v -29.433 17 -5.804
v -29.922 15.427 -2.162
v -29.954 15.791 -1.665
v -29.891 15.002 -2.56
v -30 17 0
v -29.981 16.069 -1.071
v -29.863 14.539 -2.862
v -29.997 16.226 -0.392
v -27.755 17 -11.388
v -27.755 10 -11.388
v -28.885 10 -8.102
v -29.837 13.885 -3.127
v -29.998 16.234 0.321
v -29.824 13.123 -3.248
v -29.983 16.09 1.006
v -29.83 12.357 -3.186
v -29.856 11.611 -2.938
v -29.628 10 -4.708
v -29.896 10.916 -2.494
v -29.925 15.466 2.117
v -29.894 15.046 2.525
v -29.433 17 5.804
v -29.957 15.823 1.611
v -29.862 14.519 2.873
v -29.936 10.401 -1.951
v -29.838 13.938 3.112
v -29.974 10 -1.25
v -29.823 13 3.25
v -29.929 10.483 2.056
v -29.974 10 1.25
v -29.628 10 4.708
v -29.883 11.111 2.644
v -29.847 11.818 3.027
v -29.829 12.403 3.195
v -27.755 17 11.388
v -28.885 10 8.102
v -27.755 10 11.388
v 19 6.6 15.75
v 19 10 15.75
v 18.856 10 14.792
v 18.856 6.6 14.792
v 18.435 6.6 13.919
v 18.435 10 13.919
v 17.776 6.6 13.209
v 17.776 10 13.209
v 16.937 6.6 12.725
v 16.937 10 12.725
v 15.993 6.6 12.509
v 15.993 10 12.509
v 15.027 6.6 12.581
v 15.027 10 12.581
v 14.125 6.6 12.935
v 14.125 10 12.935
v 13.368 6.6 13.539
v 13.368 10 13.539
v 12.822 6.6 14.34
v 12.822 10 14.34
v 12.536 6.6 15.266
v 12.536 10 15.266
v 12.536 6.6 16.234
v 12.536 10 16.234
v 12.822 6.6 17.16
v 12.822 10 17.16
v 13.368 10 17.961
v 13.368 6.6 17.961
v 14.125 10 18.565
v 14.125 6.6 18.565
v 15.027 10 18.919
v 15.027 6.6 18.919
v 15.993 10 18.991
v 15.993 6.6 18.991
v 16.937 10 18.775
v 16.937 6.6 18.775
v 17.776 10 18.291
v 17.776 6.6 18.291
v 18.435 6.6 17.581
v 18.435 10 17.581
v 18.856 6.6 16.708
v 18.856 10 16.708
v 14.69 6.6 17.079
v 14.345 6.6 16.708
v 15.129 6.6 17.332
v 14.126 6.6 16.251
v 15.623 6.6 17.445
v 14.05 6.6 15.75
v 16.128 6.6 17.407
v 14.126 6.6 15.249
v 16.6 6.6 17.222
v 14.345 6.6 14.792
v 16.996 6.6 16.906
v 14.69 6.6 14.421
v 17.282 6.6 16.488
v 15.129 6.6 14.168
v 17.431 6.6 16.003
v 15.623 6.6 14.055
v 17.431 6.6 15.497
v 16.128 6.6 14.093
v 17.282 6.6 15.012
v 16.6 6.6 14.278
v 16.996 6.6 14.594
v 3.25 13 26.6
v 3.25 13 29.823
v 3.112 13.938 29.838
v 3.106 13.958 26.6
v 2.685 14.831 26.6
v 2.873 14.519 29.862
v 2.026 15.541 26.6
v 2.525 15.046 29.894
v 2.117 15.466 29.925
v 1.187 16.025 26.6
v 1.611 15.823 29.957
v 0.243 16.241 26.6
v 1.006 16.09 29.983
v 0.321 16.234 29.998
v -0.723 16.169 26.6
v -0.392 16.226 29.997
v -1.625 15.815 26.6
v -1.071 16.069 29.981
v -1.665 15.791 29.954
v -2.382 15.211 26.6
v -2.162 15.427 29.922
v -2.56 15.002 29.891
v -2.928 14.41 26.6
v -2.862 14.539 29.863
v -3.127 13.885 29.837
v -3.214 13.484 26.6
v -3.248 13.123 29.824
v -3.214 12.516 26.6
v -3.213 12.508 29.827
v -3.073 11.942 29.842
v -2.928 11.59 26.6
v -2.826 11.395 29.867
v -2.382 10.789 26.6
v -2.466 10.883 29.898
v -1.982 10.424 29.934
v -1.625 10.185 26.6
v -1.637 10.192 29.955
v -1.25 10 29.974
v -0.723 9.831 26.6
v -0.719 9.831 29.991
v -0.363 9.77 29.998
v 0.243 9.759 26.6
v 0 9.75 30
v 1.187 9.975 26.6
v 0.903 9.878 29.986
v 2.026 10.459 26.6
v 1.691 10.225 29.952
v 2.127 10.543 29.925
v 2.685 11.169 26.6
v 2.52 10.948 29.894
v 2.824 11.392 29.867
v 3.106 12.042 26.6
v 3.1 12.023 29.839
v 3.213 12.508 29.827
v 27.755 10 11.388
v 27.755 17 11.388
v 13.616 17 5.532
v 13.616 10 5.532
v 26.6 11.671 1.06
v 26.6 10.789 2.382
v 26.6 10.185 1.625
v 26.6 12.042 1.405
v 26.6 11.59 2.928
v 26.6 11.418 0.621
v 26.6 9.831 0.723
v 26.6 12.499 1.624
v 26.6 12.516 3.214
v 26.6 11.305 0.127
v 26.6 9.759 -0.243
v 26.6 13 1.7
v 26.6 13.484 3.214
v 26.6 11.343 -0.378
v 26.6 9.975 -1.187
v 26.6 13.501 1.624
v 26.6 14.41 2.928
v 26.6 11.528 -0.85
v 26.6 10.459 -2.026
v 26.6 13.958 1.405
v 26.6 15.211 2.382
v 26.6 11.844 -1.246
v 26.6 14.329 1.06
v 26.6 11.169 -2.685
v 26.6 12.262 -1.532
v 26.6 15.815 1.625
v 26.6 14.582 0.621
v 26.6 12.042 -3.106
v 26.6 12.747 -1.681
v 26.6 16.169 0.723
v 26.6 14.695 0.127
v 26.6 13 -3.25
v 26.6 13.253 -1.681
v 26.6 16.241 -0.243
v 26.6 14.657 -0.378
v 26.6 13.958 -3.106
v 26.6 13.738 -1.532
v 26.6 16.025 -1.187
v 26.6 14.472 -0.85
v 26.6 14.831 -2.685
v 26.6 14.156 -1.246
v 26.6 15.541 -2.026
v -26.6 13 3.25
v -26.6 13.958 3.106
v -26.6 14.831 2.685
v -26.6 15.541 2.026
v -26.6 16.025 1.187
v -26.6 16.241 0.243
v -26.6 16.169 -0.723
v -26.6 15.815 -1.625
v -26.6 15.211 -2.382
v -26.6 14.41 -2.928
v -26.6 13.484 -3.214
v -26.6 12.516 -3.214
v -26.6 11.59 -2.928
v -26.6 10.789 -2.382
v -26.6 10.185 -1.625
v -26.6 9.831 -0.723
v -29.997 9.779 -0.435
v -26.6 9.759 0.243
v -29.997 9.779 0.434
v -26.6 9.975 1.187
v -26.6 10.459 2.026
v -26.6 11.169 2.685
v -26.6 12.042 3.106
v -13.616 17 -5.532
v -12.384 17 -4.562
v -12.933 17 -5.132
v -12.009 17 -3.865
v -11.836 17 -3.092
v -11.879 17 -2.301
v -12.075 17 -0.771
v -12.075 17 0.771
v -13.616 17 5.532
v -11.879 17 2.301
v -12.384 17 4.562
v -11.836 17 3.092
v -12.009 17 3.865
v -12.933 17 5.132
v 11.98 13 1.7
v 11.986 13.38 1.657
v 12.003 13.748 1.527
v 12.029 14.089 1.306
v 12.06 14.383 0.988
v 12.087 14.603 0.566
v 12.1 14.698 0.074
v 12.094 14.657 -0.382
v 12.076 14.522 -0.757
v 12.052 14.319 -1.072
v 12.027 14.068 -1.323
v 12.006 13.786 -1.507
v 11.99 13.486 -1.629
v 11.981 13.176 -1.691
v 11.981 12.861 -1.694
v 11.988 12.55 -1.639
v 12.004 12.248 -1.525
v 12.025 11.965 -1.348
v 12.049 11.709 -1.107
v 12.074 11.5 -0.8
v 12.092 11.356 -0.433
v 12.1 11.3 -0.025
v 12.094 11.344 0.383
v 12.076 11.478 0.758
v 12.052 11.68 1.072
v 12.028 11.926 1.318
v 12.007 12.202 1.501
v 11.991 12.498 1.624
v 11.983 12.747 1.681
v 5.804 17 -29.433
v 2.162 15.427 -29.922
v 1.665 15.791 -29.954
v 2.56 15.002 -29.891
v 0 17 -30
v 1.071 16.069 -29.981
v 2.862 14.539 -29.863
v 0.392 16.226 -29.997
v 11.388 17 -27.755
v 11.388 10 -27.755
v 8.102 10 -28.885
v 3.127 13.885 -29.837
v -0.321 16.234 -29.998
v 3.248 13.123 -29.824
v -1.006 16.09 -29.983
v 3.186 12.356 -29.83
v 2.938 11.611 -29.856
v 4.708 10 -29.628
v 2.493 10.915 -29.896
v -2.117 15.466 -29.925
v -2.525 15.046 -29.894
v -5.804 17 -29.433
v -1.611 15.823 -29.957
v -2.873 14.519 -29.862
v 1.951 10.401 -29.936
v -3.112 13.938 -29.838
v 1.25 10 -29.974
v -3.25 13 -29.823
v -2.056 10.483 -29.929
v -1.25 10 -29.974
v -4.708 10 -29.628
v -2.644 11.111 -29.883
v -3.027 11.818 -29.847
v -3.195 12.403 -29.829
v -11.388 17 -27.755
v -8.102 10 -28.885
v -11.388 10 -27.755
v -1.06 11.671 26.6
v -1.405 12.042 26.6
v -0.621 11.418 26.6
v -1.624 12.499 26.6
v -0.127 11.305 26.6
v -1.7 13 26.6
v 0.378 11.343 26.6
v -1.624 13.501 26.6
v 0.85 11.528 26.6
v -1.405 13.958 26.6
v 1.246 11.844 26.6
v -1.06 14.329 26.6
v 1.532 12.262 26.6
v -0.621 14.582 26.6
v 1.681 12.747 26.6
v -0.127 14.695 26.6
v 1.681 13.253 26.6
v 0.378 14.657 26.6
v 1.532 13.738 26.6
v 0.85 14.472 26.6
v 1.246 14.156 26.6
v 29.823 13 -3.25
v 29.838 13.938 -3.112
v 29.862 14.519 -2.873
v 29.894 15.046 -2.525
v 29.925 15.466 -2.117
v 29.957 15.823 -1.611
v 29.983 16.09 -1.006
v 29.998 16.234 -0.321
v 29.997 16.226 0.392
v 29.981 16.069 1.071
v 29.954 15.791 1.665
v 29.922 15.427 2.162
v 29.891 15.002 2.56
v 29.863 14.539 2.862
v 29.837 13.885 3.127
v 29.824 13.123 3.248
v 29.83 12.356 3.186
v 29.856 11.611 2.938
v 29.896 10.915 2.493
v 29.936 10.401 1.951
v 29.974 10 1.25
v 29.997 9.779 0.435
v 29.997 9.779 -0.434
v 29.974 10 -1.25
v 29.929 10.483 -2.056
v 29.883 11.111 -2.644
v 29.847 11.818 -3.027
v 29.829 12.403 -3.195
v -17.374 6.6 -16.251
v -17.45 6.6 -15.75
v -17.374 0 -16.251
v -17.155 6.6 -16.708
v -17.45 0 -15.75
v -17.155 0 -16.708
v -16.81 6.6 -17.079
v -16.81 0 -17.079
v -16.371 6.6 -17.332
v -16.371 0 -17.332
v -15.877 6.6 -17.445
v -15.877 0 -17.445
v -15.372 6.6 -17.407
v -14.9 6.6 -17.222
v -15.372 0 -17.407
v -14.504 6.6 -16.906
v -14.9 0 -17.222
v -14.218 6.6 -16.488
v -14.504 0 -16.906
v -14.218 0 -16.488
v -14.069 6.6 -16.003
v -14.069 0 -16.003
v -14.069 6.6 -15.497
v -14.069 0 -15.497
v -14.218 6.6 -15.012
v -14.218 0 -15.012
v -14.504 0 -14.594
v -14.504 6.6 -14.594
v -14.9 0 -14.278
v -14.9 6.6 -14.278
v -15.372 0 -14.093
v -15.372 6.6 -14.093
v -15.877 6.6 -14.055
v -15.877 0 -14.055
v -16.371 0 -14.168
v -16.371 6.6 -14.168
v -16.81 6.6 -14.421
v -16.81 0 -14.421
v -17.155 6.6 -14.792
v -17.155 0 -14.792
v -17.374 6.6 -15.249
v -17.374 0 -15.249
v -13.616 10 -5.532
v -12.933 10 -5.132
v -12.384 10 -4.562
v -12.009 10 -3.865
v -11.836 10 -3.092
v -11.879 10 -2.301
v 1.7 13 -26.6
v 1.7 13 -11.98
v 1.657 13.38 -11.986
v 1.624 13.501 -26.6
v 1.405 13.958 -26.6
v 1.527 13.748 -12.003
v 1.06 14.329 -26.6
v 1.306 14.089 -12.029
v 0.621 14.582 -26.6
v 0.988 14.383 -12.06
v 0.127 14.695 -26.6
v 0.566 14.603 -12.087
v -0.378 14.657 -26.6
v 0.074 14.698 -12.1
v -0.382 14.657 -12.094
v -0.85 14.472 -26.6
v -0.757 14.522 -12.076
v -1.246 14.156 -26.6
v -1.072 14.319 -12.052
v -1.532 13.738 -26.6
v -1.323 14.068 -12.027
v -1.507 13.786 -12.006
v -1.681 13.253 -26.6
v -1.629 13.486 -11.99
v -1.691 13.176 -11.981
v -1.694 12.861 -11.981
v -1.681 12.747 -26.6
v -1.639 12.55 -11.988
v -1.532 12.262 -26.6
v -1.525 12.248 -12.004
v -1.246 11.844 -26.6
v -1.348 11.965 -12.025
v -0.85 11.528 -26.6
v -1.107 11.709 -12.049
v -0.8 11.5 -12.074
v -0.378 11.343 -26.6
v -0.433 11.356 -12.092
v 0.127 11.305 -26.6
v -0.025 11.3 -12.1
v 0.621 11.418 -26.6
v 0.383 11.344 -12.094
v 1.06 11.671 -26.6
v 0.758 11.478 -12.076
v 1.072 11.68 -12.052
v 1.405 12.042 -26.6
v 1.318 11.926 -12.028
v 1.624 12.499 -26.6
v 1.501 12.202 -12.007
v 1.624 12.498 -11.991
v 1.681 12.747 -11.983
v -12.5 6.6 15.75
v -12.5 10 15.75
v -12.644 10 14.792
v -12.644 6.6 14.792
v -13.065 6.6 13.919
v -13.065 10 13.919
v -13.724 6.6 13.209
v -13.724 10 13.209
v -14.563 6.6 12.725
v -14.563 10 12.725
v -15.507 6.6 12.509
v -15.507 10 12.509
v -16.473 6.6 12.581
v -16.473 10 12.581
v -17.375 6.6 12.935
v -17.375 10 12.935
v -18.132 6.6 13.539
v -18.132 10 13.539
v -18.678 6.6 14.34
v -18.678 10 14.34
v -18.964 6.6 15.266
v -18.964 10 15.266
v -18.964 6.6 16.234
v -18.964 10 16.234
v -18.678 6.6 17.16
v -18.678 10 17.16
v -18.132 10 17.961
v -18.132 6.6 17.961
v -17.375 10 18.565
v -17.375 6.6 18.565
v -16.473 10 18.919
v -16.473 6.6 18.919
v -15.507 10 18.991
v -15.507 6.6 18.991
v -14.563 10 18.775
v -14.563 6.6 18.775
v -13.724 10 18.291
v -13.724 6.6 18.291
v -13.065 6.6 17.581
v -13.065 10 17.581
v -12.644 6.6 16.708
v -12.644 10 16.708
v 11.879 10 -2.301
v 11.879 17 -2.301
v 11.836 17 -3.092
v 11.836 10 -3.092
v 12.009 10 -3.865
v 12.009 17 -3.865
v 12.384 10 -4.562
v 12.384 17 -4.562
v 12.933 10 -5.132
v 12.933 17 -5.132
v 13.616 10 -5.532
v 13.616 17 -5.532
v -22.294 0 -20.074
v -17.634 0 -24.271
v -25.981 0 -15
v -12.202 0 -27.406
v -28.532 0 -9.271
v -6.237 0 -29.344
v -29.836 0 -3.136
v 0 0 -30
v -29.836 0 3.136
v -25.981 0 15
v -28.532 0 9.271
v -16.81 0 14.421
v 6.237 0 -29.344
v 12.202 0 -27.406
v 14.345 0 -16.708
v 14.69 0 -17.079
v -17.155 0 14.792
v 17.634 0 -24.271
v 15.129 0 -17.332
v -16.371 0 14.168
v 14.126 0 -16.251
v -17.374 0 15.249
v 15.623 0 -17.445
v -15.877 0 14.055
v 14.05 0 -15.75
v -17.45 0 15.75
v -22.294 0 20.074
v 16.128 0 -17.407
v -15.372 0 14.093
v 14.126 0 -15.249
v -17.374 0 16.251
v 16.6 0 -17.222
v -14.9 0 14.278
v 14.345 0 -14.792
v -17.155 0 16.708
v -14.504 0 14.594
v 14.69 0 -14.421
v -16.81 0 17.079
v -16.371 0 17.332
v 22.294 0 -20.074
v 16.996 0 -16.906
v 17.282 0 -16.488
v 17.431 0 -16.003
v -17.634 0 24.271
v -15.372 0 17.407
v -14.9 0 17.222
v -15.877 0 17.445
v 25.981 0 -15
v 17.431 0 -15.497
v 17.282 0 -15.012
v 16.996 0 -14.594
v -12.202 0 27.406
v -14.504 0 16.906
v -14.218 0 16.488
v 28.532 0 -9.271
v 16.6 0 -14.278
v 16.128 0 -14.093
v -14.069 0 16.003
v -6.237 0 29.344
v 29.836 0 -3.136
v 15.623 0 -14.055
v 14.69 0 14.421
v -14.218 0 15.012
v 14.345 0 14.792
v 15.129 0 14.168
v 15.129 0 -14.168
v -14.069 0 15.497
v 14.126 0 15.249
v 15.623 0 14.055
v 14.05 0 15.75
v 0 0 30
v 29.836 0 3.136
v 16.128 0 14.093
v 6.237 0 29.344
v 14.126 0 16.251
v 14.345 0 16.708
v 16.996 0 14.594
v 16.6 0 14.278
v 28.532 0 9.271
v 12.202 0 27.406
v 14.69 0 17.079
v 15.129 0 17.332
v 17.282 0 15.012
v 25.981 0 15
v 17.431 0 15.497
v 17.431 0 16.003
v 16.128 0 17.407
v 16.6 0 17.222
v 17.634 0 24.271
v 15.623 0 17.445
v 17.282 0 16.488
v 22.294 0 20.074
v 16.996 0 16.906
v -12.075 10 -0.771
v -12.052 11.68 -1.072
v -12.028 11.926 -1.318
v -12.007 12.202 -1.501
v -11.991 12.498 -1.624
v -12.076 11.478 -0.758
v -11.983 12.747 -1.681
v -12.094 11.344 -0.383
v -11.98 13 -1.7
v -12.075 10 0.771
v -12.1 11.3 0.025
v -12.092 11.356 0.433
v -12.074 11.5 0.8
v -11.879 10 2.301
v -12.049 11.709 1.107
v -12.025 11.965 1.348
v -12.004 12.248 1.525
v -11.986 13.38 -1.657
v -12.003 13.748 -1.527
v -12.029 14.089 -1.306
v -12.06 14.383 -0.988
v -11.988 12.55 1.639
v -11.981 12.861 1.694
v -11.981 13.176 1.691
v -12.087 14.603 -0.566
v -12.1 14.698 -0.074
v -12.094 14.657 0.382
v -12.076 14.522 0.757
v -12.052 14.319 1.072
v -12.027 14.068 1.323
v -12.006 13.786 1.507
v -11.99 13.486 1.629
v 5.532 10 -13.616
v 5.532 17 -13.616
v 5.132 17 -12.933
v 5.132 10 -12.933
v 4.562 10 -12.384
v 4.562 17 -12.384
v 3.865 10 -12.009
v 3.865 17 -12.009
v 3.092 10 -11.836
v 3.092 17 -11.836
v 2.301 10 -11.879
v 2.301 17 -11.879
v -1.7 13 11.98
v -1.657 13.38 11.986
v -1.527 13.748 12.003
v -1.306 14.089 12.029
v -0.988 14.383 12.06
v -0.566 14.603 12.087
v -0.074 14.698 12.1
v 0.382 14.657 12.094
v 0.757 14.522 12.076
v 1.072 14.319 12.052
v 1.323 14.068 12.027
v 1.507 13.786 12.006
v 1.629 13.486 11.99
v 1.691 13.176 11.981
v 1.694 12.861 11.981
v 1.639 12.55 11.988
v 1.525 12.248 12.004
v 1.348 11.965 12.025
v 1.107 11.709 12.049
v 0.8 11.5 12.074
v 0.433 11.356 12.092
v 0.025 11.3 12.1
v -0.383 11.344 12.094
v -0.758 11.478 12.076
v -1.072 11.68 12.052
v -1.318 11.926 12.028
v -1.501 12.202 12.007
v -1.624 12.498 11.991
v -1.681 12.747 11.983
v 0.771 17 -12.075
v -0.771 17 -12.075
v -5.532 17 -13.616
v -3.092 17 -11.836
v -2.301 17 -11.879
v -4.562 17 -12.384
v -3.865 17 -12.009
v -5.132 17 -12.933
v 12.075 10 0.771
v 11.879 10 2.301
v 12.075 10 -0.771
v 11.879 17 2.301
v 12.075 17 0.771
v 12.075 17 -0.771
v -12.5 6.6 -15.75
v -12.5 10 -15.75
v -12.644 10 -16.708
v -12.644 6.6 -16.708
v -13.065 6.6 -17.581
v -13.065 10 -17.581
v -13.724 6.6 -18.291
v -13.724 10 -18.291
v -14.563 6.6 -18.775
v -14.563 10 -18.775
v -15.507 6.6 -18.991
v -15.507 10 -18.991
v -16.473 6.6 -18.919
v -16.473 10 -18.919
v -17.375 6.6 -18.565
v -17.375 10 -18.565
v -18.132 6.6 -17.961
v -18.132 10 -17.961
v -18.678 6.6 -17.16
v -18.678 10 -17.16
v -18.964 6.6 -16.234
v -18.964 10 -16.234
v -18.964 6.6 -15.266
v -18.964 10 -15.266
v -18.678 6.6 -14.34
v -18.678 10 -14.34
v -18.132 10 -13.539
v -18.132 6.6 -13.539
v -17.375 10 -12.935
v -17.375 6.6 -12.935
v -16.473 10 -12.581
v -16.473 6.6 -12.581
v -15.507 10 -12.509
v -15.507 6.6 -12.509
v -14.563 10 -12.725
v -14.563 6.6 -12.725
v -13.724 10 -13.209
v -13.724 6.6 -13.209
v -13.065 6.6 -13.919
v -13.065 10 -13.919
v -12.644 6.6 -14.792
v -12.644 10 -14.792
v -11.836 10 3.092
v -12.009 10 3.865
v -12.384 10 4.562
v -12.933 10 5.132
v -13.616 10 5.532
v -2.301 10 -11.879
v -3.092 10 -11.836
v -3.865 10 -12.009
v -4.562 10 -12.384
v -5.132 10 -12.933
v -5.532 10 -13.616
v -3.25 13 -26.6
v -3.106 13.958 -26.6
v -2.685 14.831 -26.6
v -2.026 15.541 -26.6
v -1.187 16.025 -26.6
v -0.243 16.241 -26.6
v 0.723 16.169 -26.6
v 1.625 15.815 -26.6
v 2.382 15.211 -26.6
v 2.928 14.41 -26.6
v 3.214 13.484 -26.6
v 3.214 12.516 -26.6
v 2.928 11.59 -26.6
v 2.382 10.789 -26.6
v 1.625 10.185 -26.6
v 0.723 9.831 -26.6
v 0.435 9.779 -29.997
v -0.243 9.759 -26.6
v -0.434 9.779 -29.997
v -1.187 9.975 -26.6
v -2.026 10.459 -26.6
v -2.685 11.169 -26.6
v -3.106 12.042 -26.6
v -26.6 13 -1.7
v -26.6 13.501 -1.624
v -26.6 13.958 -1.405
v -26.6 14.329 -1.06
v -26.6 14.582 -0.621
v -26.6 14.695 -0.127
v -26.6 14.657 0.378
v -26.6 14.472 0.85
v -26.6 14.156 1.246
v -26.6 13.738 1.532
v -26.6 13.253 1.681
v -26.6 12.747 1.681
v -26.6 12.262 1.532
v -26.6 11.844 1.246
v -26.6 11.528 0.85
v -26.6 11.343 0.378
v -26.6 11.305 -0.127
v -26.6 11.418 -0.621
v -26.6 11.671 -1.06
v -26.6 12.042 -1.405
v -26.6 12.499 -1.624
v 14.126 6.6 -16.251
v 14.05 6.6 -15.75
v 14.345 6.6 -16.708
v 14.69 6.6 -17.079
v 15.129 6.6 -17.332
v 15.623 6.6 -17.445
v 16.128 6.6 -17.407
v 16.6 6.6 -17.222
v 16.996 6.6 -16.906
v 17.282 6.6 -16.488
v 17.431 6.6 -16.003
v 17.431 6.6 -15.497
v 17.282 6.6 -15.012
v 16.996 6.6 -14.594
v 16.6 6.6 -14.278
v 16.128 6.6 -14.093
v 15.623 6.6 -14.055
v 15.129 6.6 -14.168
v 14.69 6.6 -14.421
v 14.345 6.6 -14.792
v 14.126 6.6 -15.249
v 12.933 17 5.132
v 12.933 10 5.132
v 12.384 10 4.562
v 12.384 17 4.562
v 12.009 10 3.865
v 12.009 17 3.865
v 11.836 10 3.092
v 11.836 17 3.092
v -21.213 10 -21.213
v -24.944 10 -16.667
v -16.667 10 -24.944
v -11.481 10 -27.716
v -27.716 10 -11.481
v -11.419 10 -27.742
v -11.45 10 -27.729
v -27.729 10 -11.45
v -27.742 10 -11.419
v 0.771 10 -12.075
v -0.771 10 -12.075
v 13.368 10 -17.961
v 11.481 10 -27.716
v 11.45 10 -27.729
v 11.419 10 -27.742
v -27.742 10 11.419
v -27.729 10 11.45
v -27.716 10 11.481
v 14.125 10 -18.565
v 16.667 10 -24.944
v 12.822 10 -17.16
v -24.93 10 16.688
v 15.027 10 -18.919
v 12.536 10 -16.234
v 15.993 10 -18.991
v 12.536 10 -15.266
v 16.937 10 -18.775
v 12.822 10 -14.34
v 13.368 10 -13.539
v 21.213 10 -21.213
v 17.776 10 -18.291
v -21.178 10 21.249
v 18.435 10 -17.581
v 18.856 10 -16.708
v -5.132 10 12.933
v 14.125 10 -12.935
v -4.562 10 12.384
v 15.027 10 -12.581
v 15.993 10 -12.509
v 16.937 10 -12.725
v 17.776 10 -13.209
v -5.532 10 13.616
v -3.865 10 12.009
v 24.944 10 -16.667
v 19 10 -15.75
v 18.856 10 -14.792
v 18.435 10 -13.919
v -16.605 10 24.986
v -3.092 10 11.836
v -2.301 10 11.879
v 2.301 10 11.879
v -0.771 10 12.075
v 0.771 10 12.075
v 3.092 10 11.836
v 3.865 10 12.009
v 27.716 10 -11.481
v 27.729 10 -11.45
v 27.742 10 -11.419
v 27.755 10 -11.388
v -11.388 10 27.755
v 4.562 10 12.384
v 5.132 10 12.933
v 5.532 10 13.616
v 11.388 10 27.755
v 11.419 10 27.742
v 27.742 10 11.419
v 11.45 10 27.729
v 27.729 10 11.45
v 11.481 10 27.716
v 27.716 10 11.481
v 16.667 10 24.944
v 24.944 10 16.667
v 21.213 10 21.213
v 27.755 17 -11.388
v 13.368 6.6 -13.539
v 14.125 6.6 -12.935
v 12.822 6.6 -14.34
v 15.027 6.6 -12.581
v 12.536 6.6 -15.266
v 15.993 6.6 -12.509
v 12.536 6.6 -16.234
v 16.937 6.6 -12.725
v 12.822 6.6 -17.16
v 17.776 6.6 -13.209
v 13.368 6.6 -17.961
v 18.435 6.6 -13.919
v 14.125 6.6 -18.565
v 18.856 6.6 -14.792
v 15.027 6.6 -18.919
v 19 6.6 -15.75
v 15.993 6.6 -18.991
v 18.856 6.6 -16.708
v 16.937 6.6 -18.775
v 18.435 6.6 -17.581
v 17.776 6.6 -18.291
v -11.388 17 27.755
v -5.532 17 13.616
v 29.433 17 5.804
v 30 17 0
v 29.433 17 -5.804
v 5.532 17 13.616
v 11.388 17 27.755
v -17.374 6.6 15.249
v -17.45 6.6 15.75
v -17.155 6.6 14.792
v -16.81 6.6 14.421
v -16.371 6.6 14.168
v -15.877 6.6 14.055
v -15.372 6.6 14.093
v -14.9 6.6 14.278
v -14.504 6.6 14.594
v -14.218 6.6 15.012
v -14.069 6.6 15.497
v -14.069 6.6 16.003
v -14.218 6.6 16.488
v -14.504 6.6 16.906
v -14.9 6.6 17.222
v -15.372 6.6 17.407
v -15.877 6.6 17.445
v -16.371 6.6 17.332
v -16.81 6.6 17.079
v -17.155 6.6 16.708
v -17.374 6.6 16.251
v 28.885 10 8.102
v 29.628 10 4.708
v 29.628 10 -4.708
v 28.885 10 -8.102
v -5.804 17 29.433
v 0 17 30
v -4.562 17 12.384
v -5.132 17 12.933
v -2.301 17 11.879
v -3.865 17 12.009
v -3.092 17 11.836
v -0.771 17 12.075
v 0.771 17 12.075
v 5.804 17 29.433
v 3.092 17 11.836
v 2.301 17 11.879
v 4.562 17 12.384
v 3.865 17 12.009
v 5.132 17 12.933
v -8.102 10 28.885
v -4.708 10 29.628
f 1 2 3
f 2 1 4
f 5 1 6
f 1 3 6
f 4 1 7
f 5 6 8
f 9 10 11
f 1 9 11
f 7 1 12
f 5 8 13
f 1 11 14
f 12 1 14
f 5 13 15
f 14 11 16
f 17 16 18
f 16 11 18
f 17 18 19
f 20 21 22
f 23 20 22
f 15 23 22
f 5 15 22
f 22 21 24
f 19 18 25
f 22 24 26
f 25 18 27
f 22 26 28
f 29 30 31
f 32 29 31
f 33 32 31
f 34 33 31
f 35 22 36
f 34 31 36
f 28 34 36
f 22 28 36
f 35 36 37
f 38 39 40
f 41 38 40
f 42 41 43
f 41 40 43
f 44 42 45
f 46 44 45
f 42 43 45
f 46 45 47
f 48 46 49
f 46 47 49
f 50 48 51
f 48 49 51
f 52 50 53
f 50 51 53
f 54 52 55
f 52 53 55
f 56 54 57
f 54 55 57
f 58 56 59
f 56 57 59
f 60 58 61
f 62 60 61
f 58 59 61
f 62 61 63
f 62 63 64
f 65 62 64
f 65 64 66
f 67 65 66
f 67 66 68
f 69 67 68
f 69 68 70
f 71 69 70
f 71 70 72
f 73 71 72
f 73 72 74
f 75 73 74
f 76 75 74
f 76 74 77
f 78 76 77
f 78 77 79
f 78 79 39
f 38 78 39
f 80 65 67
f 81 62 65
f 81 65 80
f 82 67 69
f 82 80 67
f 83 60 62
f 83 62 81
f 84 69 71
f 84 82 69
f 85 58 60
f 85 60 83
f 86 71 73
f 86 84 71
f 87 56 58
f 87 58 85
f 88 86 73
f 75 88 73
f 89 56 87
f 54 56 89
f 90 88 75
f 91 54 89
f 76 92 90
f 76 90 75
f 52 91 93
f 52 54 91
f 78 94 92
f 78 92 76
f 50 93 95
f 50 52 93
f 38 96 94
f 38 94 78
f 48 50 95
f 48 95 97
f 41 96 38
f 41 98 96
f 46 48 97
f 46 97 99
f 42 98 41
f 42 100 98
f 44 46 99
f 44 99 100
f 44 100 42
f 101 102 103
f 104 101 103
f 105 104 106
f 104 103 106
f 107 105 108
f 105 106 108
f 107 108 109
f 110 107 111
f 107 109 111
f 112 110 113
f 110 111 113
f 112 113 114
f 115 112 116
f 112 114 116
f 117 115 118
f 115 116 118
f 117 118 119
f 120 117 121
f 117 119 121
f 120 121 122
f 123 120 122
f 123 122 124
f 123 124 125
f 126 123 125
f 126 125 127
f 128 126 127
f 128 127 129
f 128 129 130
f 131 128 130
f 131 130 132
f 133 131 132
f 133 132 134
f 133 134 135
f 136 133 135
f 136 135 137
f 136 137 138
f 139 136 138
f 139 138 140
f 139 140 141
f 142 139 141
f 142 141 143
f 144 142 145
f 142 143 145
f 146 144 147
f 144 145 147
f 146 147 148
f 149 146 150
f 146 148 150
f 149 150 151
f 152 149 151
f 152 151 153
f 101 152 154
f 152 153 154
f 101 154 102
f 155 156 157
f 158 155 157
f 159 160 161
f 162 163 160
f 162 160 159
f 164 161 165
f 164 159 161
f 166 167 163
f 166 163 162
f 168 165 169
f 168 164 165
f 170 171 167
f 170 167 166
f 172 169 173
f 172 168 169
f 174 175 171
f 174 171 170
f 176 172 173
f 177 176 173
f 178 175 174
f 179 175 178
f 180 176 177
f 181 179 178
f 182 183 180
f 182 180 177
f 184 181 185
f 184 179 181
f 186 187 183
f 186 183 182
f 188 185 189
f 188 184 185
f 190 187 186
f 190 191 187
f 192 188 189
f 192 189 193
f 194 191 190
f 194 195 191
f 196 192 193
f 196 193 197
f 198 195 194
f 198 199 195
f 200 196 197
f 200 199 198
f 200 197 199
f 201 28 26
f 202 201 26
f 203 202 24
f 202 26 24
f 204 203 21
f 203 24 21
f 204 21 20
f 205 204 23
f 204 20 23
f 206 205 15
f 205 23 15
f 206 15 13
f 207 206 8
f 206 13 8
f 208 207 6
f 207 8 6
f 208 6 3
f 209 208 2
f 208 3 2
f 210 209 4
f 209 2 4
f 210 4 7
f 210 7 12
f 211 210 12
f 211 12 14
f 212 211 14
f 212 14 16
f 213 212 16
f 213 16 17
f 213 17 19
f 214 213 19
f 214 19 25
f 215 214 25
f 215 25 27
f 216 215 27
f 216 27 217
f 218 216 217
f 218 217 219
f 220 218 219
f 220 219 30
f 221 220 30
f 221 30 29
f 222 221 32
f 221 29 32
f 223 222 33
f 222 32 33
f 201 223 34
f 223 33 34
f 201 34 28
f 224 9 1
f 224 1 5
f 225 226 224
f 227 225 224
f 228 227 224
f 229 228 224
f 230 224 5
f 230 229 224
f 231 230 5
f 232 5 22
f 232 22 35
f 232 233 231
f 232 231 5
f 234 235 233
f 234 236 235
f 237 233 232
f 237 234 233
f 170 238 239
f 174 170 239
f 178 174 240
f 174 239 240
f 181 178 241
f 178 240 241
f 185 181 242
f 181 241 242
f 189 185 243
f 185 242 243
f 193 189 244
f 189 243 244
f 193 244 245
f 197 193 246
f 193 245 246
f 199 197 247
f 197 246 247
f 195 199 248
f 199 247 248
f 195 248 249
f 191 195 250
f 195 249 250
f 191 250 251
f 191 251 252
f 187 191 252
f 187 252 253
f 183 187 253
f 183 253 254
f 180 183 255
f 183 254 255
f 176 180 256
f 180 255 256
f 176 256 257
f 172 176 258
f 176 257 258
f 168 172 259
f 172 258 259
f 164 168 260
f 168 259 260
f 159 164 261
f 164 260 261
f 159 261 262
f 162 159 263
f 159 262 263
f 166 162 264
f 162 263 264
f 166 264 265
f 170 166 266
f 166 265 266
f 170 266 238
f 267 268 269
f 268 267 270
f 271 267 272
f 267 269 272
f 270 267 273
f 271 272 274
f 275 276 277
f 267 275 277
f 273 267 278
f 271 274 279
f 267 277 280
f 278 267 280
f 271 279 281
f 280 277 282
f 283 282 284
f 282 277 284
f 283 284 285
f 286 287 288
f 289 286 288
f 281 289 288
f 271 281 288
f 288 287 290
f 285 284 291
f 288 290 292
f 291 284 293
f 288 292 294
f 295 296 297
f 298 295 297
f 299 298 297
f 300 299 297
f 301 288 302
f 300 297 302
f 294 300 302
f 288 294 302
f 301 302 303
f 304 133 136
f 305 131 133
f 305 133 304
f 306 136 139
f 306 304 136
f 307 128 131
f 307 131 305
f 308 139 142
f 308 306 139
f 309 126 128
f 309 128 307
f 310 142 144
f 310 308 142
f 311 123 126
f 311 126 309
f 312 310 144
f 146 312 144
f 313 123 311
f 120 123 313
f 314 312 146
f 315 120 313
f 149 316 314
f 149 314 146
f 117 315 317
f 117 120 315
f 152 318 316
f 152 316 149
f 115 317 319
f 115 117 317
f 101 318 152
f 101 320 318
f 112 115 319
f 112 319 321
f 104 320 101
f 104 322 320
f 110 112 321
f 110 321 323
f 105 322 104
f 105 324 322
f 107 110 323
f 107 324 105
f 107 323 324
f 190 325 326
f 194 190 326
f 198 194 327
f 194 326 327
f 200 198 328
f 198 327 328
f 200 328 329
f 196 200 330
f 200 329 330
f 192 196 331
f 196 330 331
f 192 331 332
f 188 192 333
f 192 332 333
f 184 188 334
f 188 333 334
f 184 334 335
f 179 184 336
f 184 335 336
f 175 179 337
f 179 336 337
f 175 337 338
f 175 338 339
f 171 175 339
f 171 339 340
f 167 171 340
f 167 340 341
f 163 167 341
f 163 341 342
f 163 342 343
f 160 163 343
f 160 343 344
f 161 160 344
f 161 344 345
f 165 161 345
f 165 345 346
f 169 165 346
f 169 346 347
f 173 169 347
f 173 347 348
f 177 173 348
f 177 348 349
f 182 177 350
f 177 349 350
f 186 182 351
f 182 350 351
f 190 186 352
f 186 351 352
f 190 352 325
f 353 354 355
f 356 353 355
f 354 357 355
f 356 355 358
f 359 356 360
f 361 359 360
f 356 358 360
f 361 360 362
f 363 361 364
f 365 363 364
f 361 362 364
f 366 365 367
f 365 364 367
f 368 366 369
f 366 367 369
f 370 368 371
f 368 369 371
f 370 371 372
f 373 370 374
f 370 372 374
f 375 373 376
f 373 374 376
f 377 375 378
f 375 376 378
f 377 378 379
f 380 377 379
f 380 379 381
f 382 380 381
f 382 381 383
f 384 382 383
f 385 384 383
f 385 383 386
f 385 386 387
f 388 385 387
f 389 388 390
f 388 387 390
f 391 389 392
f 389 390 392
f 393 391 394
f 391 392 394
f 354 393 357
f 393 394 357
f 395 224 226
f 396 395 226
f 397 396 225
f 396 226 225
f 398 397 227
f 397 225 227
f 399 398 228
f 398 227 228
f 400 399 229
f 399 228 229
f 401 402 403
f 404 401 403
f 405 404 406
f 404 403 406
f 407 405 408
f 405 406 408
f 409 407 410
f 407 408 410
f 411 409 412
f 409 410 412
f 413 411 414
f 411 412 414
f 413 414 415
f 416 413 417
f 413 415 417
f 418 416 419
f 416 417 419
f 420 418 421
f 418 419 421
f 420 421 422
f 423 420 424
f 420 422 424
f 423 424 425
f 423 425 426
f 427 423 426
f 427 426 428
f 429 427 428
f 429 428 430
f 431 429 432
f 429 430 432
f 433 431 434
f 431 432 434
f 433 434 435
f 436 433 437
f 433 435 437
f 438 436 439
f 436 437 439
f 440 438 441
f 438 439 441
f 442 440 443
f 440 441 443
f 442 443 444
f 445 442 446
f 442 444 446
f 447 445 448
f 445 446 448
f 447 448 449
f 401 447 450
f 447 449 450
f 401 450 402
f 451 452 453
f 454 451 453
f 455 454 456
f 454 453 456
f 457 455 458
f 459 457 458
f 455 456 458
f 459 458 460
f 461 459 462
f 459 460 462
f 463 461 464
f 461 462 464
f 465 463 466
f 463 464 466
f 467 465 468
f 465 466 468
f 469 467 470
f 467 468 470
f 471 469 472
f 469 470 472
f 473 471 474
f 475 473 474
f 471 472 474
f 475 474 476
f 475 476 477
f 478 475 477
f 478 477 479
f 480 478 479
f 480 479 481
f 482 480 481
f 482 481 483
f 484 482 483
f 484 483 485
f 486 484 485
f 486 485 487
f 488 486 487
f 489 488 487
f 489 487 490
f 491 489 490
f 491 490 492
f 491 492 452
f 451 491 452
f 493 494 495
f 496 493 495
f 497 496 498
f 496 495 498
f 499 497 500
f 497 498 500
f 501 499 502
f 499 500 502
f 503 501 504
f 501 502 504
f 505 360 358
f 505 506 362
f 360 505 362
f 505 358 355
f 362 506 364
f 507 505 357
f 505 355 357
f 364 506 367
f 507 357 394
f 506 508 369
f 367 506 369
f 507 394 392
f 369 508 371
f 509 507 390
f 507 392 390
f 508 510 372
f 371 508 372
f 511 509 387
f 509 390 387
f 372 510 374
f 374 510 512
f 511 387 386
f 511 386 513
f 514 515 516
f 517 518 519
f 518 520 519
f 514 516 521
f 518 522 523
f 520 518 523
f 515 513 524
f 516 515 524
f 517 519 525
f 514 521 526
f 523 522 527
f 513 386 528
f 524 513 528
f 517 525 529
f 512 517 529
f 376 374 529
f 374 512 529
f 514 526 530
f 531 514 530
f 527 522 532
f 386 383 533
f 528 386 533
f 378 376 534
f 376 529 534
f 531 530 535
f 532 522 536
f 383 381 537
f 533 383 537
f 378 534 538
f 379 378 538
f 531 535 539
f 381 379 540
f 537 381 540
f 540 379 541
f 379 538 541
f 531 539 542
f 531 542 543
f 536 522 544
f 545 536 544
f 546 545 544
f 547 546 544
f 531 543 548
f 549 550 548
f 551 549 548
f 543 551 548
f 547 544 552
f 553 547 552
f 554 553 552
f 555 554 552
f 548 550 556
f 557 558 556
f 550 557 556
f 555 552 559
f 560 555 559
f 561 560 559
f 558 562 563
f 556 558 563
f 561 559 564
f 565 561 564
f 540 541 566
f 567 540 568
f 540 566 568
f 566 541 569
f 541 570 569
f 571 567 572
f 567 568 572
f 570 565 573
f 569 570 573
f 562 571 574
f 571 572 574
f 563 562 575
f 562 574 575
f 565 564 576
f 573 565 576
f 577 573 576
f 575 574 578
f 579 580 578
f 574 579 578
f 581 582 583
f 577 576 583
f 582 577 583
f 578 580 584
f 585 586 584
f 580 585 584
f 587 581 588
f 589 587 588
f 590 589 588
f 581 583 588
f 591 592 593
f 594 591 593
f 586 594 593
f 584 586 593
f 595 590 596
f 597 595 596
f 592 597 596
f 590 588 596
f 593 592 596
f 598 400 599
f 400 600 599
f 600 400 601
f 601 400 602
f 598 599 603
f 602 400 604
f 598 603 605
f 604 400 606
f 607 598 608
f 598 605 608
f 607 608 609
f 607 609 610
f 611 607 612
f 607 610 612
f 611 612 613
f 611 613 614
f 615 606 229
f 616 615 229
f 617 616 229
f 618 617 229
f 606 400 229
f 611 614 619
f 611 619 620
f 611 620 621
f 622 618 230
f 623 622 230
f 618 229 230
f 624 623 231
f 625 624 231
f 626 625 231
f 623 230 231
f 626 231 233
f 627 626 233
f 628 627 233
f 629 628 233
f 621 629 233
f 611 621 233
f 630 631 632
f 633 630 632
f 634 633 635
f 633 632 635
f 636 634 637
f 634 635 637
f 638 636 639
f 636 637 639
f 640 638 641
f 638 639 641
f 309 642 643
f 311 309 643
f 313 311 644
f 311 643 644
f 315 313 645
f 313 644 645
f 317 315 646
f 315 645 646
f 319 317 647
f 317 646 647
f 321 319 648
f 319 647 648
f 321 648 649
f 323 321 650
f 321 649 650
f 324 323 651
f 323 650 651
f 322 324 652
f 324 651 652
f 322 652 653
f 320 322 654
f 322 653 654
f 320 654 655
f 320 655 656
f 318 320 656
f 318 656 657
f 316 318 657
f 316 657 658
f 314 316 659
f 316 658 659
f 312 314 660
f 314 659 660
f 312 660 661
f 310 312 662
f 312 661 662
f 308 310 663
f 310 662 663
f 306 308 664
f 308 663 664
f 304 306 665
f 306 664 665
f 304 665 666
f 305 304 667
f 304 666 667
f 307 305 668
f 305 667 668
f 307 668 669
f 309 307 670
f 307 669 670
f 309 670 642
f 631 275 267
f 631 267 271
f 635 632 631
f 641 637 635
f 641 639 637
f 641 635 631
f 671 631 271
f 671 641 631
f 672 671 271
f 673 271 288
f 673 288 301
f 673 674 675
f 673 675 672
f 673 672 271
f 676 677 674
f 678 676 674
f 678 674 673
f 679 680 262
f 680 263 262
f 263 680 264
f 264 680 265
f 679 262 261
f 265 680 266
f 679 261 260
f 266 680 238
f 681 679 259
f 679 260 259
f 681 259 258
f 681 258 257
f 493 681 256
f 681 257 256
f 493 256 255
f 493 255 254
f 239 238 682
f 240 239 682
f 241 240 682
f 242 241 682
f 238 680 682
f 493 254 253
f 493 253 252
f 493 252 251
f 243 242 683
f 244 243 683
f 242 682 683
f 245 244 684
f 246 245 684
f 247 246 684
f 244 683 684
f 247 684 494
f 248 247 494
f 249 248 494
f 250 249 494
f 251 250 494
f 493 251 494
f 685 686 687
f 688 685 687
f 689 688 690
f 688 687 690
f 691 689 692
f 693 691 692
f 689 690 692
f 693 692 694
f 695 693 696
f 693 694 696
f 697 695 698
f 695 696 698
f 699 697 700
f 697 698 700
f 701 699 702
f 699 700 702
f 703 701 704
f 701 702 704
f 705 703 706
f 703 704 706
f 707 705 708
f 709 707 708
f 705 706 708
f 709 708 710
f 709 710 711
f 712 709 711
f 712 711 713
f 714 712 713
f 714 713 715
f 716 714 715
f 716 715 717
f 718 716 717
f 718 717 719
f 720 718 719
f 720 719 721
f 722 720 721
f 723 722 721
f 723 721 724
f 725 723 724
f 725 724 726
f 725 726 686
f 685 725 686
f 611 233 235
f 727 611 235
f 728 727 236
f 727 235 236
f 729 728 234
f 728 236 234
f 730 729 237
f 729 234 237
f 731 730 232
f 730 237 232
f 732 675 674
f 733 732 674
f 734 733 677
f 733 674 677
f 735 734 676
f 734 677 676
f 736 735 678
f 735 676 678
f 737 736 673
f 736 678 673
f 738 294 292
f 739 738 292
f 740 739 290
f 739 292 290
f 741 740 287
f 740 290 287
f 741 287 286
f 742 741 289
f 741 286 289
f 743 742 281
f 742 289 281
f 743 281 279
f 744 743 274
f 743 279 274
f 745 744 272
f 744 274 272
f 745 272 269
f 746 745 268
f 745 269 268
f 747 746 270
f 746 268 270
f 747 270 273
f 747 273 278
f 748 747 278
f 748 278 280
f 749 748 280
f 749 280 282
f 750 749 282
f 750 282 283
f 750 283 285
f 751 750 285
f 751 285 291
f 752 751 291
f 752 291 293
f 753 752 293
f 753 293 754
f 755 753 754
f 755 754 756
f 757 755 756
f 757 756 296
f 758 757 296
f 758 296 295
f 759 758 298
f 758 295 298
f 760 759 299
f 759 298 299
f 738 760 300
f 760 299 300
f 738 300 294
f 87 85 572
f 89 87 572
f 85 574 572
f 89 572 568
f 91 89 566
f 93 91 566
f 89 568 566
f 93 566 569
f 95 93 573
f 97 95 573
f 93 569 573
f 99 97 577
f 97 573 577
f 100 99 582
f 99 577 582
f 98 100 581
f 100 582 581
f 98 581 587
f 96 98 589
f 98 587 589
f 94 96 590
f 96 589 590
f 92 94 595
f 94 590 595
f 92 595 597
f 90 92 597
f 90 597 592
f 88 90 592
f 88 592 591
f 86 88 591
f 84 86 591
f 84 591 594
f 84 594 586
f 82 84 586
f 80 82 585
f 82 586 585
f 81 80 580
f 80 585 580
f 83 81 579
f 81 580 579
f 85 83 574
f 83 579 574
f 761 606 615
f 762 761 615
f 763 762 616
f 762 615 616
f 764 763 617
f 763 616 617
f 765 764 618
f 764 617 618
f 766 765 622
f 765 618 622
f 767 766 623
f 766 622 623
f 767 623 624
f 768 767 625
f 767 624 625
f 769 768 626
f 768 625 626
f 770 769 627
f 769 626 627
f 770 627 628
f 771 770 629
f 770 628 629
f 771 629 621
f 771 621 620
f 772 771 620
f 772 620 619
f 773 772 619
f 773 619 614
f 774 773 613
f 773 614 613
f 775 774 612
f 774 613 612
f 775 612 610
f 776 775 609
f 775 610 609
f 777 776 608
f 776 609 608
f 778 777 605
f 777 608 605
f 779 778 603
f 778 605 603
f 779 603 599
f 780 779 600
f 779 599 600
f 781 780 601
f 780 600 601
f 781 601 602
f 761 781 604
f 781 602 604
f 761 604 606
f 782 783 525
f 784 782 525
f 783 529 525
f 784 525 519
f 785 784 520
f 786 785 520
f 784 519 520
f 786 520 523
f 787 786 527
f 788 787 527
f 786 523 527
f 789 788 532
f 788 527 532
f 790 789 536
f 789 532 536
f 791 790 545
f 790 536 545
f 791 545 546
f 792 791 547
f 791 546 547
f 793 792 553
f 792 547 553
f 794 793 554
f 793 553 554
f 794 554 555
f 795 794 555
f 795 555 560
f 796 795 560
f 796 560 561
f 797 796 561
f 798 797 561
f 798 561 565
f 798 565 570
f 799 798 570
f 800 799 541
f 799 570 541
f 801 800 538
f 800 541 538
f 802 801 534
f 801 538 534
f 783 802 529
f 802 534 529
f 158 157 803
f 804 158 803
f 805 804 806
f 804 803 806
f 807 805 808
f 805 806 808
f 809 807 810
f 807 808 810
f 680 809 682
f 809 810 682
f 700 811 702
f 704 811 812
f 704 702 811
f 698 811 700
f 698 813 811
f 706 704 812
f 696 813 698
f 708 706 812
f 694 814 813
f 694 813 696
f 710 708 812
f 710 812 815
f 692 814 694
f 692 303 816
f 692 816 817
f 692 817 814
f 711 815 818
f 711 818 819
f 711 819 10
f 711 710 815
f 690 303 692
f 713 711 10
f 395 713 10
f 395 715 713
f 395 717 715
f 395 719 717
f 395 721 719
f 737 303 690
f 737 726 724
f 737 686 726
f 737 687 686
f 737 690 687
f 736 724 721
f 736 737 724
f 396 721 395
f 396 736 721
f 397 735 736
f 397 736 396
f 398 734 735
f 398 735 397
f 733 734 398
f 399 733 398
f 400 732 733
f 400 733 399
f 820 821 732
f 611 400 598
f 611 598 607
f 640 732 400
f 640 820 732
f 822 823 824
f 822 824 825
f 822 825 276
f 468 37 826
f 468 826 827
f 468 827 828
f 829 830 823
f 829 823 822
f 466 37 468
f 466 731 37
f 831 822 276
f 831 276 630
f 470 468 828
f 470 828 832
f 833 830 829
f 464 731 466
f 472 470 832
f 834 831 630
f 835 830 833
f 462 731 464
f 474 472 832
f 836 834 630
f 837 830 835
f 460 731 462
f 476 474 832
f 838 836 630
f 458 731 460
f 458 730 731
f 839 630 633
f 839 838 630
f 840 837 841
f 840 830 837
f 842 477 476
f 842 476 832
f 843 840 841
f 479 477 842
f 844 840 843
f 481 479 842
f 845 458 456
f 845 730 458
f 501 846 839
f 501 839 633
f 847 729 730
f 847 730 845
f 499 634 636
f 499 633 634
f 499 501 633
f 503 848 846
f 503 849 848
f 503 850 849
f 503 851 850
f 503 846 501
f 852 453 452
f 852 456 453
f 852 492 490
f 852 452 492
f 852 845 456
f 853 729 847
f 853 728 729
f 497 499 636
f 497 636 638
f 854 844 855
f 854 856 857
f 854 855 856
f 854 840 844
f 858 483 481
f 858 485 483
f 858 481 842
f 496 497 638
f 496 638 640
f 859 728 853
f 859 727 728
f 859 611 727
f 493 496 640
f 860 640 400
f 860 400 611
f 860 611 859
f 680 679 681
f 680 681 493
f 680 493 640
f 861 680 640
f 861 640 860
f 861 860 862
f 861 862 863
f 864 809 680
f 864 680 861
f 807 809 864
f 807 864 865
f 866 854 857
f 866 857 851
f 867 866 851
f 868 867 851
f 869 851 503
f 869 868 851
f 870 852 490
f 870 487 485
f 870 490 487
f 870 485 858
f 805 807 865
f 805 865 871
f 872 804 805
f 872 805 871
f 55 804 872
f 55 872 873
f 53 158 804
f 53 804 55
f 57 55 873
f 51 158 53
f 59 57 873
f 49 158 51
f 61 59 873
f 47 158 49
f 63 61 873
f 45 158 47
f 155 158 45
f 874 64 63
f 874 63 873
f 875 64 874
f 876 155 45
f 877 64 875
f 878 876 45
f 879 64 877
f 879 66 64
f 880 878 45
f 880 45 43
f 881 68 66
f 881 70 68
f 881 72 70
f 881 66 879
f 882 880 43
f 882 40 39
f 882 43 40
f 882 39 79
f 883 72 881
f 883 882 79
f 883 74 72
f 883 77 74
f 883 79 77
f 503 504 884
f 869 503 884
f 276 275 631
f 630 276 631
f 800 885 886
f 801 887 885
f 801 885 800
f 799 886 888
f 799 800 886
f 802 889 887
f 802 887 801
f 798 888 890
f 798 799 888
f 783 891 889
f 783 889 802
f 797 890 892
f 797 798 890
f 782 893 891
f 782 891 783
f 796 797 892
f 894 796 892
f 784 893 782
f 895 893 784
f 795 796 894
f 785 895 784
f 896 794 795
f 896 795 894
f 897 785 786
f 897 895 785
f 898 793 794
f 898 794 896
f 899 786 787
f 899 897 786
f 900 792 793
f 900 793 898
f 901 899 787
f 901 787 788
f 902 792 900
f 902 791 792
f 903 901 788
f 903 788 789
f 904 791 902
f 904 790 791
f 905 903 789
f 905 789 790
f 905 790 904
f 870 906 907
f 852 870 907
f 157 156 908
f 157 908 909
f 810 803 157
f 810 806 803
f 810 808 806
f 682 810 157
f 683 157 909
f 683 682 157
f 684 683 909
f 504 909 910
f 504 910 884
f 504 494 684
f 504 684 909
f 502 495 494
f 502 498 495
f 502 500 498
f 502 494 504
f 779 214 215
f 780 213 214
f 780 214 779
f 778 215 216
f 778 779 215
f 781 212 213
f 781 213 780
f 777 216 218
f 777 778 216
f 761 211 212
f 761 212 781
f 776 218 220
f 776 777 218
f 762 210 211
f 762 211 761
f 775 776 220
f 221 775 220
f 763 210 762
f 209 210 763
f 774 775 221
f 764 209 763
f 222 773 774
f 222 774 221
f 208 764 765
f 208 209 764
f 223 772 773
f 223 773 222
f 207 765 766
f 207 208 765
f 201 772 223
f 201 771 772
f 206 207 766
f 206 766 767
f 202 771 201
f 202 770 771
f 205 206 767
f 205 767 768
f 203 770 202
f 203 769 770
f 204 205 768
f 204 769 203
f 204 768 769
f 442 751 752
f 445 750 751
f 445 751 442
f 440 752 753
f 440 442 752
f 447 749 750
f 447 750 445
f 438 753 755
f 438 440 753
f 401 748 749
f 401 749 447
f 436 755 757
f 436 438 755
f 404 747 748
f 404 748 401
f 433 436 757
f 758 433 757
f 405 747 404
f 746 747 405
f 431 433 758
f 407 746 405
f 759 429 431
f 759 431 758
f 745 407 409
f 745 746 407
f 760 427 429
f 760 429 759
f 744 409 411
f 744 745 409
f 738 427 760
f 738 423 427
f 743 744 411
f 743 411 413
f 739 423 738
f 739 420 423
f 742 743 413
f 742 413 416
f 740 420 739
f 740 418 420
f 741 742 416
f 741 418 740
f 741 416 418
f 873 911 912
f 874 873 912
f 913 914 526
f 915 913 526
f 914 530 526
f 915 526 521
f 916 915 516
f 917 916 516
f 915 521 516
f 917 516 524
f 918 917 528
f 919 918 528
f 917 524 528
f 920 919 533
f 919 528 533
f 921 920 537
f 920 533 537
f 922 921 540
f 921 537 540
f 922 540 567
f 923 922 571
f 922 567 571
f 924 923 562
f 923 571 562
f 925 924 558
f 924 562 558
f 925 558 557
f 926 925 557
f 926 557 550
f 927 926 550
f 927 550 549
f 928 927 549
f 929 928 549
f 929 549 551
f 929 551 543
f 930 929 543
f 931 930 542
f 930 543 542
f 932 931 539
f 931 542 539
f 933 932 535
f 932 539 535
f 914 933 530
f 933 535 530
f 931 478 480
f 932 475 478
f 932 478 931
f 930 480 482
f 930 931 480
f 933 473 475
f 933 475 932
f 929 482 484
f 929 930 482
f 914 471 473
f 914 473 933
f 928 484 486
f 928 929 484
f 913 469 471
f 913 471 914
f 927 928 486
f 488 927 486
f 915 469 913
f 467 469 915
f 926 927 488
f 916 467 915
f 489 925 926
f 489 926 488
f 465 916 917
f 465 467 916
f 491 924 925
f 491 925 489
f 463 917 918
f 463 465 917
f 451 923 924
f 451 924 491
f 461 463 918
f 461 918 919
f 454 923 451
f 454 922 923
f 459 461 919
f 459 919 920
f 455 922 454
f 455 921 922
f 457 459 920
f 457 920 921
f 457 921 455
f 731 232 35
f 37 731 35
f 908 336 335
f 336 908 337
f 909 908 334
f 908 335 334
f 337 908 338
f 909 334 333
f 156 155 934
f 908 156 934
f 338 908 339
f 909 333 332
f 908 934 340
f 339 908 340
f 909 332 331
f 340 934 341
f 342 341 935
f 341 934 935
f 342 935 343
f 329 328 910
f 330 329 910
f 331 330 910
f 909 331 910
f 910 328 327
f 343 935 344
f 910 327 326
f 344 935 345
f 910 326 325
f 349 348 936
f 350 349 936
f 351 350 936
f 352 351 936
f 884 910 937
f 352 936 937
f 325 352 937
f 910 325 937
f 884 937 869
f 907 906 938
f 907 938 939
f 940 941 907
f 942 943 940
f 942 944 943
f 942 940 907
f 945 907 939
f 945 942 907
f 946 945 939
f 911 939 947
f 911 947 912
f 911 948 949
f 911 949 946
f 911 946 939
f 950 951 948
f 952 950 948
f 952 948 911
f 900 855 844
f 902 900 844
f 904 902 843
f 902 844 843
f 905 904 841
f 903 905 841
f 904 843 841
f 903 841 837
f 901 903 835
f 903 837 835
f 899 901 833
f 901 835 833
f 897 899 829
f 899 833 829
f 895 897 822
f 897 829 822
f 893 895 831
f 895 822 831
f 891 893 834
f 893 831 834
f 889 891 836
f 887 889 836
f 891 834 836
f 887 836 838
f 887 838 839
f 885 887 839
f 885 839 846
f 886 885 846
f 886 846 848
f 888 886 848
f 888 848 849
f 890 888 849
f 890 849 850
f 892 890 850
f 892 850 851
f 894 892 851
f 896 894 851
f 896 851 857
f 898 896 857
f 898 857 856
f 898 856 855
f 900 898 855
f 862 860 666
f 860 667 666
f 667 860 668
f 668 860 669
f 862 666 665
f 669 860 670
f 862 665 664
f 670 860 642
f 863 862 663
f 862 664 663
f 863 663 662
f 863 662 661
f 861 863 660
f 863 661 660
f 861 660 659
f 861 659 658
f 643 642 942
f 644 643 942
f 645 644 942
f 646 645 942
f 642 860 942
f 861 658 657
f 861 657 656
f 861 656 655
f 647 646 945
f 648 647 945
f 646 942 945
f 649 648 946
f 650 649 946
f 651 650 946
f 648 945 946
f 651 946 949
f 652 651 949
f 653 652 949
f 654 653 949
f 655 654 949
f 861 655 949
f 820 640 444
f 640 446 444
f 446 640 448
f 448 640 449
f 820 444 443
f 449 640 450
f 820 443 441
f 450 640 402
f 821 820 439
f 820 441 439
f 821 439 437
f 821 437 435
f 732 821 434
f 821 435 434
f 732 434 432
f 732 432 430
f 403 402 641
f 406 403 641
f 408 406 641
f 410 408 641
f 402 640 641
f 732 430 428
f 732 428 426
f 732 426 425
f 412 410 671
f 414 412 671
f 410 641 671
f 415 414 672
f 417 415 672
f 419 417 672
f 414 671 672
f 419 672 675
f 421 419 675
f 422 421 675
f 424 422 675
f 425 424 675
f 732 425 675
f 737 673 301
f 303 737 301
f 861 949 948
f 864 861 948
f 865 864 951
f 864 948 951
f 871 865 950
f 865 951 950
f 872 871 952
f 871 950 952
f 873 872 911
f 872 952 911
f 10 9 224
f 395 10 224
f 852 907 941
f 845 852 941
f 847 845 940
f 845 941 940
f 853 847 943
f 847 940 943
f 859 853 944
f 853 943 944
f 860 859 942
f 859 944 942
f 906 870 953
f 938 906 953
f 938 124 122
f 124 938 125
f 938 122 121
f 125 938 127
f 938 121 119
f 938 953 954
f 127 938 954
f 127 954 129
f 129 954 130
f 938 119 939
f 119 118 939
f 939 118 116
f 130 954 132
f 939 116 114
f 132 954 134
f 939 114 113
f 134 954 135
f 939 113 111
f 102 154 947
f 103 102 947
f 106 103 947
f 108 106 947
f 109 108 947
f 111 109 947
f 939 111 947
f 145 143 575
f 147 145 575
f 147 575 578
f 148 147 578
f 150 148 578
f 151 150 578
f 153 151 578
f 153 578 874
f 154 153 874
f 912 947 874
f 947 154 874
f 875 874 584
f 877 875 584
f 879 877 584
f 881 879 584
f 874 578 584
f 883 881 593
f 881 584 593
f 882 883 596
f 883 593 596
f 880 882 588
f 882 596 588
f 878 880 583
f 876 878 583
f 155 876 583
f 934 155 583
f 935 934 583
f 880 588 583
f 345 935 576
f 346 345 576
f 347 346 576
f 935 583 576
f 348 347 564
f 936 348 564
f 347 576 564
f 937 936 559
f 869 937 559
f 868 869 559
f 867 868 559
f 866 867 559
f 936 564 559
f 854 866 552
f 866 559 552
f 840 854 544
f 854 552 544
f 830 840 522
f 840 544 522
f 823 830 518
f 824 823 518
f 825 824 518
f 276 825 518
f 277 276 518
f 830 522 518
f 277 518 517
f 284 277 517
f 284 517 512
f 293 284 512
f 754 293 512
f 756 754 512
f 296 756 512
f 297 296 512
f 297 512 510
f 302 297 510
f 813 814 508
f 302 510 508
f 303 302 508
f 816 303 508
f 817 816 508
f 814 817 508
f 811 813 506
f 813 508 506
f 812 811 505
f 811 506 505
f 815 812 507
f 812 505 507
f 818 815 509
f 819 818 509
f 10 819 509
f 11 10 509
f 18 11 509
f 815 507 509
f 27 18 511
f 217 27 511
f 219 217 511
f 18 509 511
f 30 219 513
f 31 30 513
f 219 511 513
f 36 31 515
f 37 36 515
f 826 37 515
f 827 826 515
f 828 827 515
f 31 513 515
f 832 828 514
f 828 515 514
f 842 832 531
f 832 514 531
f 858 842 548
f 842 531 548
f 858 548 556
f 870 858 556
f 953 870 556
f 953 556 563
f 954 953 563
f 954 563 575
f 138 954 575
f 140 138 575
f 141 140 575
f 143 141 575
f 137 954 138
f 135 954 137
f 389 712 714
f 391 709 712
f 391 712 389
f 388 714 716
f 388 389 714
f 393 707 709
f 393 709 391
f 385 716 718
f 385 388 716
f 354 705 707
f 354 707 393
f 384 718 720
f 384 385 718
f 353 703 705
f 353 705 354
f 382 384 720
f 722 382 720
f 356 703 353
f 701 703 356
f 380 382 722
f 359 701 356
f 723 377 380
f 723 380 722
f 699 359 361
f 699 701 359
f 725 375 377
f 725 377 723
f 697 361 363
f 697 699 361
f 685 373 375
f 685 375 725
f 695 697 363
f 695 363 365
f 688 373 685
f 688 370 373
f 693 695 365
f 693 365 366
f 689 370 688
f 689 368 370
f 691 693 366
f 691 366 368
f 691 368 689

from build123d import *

# Parameters (mm, degrees)
SKETCH1_R                                           = 30
BOSS_EXTRUDE1_DEPTH                                 = 10
CBORE_FOR_M3_HEX_SOCKET_HEAD_CAP_SCREW1_D           = 3.4
CBORE_FOR_M3_HEX_SOCKET_HEAD_CAP_SCREW1_CBORE_D     = 6.5
CBORE_FOR_M3_HEX_SOCKET_HEAD_CAP_SCREW1_CBORE_DEPTH = 3.4
BOSS_EXTRUDE2_DEPTH                                 = 7
CBORE_FOR_M3_HEX_SOCKET_HEAD_CAP_SCREW2_D           = 3.4
CBORE_FOR_M3_HEX_SOCKET_HEAD_CAP_SCREW2_DEPTH       = 18.91444561
CBORE_FOR_M3_HEX_SOCKET_HEAD_CAP_SCREW2_CBORE_D     = 6.5
CBORE_FOR_M3_HEX_SOCKET_HEAD_CAP_SCREW2_CBORE_DEPTH = 3.4
CIRPATTERN1_COUNT                                   = 4
FILLET1_R                                           = 3
CUT_EXTRUDE1_REACH                                  = 47.706
CIRPATTERN2_COUNT                                   = 4


with BuildPart() as part:
    # Sketch1 → Boss-Extrude1 (new body)
    with BuildSketch(Plane(origin=(0, 0, 0), x_dir=(1, 0, 0), z_dir=(0, 1, 0))):
        with Locations(Location((0, 0, 0), (0, 0, 270))):
            Circle(SKETCH1_R)
    extrude(amount=BOSS_EXTRUDE1_DEPTH)

    # CBORE for M3 Hex Socket Head Cap Screw1 (through all)
    with Locations(Plane(origin=(0, 10, 0), x_dir=(1, 0, 0), z_dir=(0, 1, 0))):
        with Locations((15.75, -15.75), (15.75, 15.75), (-15.75, 15.75), (-15.75, -15.75)):
            CounterBoreHole(CBORE_FOR_M3_HEX_SOCKET_HEAD_CAP_SCREW1_D / 2, CBORE_FOR_M3_HEX_SOCKET_HEAD_CAP_SCREW1_CBORE_D / 2, CBORE_FOR_M3_HEX_SOCKET_HEAD_CAP_SCREW1_CBORE_DEPTH)

    # Sketch5 → Boss-Extrude2 (add)
    with BuildSketch(Plane(origin=(0, 10, 0), x_dir=(1, 0, 0), z_dir=(0, 1, 0))):
        with BuildLine():
            ThreePointArc((4.592201188, -11.08655439), (0, -12), (-4.592201188, -11.08655439))
            Line((-4.592201188, -11.08655439), (-11.480502971, -27.716385975))
            ThreePointArc((-11.480502971, -27.716385975), (0, -30), (11.480502971, -27.716385975))
            Line((11.480502971, -27.716385975), (4.592201188, -11.08655439))
        make_face()
    boss_extrude2 = extrude(amount=BOSS_EXTRUDE2_DEPTH)

    # CBORE for M3 Hex Socket Head Cap Screw2
    with Locations(Plane.XY.offset(30)):
        with Locations((0, 13)):
            cbore_for_m3_hex_socket_head_cap_screw2 = CounterBoreHole(CBORE_FOR_M3_HEX_SOCKET_HEAD_CAP_SCREW2_D / 2, CBORE_FOR_M3_HEX_SOCKET_HEAD_CAP_SCREW2_CBORE_D / 2, CBORE_FOR_M3_HEX_SOCKET_HEAD_CAP_SCREW2_CBORE_DEPTH, depth=CBORE_FOR_M3_HEX_SOCKET_HEAD_CAP_SCREW2_DEPTH)

    # CirPattern1: Boss-Extrude2, CBORE for M3 Hex Socket Head Cap Screw2 ×4 about axis
    cirpattern1_axis = Axis((0, 0, 0), (0, 1, 0))
    add([boss_extrude2.rotate(cirpattern1_axis, i * 360 / CIRPATTERN1_COUNT) for i in range(1, CIRPATTERN1_COUNT)])
    add([cbore_for_m3_hex_socket_head_cap_screw2.rotate(cirpattern1_axis, i * 360 / CIRPATTERN1_COUNT) for i in range(1, CIRPATTERN1_COUNT)], mode=Mode.SUBTRACT)

    # Fillet1
    fillet1_edges = [part.edges().sort_by_distance(p)[0] for p in [
        (4.592201188, 13.5, 11.08655439),
        (-4.592201188, 13.5, 11.08655439),
        (11.08655439, 13.5, -4.592201188),
        (11.08655439, 13.5, 4.592201188),
        (-4.592201188, 13.5, -11.08655439),
        (4.592201188, 13.5, -11.08655439),
        (-11.08655439, 13.5, 4.592201188),
        (-11.08655439, 13.5, -4.592201188),
    ]]
    fillet(fillet1_edges, radius=FILLET1_R)

    # Cut-Extrude1: up to this face of the body (flat: up to its plane)
    cut_extrude1_end = Plane(part.part.faces().sort_by_distance((0, 10, 0))[0])
    # Sketch8 → Cut-Extrude1 (cut, up to the picked face)
    with BuildSketch(Plane(origin=(0, 17, 0), x_dir=(1, 0, 0), z_dir=(0, 1, 0)), mode=Mode.PRIVATE) as cut_extrude1_sk1:
        with BuildLine():
            Line((-13.616468974, -5.531886901), (-27.754500338, -11.388051237))
            ThreePointArc((-27.754500338, -11.388051237), (-27.735481678, -11.434292985), (-27.716385975, -11.480502971))
            Line((-27.716385975, -11.480502971), (-13.578200631, -5.624274854))
            ThreePointArc((-13.578200631, -5.624274854), (-12.084036828, -4.273447521), (-11.781000742, -2.282109005))
            ThreePointArc((-11.781000742, -2.282109005), (-12, 0), (-11.781000742, 2.282109005))
            ThreePointArc((-11.781000742, 2.282109005), (-12.084036828, 4.273447521), (-13.578200631, 5.624274854))
            Line((-13.578200631, 5.624274854), (-27.716385975, 11.480502971))
            ThreePointArc((-27.716385975, 11.480502971), (-27.735481678, 11.434292985), (-27.754500338, 11.388051237))
            Line((-27.754500338, 11.388051237), (-13.616468974, 5.531886901))
            ThreePointArc((-13.616468974, 5.531886901), (-12.172110631, 4.226087145), (-11.879175748, 2.30112658))
            ThreePointArc((-11.879175748, 2.30112658), (-12.1, 0), (-11.879175748, -2.30112658))
            ThreePointArc((-11.879175748, -2.30112658), (-12.172110631, -4.226087145), (-13.616468974, -5.531886901))
        make_face()
    cut_extrude1_tool1 = split(extrude(cut_extrude1_sk1.sketch, amount=-CUT_EXTRUDE1_REACH, mode=Mode.PRIVATE), bisect_by=cut_extrude1_end, keep=Keep.BOTH, mode=Mode.PRIVATE)
    cut_extrude1 = cut_extrude1_tool1.solids().sort_by(Axis((-12.147448, 17, 4.239349), (0, -1, 0)))[0]
    add(cut_extrude1, mode=Mode.SUBTRACT)

    # CirPattern2: Cut-Extrude1 ×4 about axis
    cirpattern2_axis = Axis((0, 0, 0), (0, 1, 0))
    for i in range(1, CIRPATTERN2_COUNT):
        add(cut_extrude1.rotate(cirpattern2_axis, i * 360 / CIRPATTERN2_COUNT), mode=Mode.SUBTRACT)


solid = part.part
